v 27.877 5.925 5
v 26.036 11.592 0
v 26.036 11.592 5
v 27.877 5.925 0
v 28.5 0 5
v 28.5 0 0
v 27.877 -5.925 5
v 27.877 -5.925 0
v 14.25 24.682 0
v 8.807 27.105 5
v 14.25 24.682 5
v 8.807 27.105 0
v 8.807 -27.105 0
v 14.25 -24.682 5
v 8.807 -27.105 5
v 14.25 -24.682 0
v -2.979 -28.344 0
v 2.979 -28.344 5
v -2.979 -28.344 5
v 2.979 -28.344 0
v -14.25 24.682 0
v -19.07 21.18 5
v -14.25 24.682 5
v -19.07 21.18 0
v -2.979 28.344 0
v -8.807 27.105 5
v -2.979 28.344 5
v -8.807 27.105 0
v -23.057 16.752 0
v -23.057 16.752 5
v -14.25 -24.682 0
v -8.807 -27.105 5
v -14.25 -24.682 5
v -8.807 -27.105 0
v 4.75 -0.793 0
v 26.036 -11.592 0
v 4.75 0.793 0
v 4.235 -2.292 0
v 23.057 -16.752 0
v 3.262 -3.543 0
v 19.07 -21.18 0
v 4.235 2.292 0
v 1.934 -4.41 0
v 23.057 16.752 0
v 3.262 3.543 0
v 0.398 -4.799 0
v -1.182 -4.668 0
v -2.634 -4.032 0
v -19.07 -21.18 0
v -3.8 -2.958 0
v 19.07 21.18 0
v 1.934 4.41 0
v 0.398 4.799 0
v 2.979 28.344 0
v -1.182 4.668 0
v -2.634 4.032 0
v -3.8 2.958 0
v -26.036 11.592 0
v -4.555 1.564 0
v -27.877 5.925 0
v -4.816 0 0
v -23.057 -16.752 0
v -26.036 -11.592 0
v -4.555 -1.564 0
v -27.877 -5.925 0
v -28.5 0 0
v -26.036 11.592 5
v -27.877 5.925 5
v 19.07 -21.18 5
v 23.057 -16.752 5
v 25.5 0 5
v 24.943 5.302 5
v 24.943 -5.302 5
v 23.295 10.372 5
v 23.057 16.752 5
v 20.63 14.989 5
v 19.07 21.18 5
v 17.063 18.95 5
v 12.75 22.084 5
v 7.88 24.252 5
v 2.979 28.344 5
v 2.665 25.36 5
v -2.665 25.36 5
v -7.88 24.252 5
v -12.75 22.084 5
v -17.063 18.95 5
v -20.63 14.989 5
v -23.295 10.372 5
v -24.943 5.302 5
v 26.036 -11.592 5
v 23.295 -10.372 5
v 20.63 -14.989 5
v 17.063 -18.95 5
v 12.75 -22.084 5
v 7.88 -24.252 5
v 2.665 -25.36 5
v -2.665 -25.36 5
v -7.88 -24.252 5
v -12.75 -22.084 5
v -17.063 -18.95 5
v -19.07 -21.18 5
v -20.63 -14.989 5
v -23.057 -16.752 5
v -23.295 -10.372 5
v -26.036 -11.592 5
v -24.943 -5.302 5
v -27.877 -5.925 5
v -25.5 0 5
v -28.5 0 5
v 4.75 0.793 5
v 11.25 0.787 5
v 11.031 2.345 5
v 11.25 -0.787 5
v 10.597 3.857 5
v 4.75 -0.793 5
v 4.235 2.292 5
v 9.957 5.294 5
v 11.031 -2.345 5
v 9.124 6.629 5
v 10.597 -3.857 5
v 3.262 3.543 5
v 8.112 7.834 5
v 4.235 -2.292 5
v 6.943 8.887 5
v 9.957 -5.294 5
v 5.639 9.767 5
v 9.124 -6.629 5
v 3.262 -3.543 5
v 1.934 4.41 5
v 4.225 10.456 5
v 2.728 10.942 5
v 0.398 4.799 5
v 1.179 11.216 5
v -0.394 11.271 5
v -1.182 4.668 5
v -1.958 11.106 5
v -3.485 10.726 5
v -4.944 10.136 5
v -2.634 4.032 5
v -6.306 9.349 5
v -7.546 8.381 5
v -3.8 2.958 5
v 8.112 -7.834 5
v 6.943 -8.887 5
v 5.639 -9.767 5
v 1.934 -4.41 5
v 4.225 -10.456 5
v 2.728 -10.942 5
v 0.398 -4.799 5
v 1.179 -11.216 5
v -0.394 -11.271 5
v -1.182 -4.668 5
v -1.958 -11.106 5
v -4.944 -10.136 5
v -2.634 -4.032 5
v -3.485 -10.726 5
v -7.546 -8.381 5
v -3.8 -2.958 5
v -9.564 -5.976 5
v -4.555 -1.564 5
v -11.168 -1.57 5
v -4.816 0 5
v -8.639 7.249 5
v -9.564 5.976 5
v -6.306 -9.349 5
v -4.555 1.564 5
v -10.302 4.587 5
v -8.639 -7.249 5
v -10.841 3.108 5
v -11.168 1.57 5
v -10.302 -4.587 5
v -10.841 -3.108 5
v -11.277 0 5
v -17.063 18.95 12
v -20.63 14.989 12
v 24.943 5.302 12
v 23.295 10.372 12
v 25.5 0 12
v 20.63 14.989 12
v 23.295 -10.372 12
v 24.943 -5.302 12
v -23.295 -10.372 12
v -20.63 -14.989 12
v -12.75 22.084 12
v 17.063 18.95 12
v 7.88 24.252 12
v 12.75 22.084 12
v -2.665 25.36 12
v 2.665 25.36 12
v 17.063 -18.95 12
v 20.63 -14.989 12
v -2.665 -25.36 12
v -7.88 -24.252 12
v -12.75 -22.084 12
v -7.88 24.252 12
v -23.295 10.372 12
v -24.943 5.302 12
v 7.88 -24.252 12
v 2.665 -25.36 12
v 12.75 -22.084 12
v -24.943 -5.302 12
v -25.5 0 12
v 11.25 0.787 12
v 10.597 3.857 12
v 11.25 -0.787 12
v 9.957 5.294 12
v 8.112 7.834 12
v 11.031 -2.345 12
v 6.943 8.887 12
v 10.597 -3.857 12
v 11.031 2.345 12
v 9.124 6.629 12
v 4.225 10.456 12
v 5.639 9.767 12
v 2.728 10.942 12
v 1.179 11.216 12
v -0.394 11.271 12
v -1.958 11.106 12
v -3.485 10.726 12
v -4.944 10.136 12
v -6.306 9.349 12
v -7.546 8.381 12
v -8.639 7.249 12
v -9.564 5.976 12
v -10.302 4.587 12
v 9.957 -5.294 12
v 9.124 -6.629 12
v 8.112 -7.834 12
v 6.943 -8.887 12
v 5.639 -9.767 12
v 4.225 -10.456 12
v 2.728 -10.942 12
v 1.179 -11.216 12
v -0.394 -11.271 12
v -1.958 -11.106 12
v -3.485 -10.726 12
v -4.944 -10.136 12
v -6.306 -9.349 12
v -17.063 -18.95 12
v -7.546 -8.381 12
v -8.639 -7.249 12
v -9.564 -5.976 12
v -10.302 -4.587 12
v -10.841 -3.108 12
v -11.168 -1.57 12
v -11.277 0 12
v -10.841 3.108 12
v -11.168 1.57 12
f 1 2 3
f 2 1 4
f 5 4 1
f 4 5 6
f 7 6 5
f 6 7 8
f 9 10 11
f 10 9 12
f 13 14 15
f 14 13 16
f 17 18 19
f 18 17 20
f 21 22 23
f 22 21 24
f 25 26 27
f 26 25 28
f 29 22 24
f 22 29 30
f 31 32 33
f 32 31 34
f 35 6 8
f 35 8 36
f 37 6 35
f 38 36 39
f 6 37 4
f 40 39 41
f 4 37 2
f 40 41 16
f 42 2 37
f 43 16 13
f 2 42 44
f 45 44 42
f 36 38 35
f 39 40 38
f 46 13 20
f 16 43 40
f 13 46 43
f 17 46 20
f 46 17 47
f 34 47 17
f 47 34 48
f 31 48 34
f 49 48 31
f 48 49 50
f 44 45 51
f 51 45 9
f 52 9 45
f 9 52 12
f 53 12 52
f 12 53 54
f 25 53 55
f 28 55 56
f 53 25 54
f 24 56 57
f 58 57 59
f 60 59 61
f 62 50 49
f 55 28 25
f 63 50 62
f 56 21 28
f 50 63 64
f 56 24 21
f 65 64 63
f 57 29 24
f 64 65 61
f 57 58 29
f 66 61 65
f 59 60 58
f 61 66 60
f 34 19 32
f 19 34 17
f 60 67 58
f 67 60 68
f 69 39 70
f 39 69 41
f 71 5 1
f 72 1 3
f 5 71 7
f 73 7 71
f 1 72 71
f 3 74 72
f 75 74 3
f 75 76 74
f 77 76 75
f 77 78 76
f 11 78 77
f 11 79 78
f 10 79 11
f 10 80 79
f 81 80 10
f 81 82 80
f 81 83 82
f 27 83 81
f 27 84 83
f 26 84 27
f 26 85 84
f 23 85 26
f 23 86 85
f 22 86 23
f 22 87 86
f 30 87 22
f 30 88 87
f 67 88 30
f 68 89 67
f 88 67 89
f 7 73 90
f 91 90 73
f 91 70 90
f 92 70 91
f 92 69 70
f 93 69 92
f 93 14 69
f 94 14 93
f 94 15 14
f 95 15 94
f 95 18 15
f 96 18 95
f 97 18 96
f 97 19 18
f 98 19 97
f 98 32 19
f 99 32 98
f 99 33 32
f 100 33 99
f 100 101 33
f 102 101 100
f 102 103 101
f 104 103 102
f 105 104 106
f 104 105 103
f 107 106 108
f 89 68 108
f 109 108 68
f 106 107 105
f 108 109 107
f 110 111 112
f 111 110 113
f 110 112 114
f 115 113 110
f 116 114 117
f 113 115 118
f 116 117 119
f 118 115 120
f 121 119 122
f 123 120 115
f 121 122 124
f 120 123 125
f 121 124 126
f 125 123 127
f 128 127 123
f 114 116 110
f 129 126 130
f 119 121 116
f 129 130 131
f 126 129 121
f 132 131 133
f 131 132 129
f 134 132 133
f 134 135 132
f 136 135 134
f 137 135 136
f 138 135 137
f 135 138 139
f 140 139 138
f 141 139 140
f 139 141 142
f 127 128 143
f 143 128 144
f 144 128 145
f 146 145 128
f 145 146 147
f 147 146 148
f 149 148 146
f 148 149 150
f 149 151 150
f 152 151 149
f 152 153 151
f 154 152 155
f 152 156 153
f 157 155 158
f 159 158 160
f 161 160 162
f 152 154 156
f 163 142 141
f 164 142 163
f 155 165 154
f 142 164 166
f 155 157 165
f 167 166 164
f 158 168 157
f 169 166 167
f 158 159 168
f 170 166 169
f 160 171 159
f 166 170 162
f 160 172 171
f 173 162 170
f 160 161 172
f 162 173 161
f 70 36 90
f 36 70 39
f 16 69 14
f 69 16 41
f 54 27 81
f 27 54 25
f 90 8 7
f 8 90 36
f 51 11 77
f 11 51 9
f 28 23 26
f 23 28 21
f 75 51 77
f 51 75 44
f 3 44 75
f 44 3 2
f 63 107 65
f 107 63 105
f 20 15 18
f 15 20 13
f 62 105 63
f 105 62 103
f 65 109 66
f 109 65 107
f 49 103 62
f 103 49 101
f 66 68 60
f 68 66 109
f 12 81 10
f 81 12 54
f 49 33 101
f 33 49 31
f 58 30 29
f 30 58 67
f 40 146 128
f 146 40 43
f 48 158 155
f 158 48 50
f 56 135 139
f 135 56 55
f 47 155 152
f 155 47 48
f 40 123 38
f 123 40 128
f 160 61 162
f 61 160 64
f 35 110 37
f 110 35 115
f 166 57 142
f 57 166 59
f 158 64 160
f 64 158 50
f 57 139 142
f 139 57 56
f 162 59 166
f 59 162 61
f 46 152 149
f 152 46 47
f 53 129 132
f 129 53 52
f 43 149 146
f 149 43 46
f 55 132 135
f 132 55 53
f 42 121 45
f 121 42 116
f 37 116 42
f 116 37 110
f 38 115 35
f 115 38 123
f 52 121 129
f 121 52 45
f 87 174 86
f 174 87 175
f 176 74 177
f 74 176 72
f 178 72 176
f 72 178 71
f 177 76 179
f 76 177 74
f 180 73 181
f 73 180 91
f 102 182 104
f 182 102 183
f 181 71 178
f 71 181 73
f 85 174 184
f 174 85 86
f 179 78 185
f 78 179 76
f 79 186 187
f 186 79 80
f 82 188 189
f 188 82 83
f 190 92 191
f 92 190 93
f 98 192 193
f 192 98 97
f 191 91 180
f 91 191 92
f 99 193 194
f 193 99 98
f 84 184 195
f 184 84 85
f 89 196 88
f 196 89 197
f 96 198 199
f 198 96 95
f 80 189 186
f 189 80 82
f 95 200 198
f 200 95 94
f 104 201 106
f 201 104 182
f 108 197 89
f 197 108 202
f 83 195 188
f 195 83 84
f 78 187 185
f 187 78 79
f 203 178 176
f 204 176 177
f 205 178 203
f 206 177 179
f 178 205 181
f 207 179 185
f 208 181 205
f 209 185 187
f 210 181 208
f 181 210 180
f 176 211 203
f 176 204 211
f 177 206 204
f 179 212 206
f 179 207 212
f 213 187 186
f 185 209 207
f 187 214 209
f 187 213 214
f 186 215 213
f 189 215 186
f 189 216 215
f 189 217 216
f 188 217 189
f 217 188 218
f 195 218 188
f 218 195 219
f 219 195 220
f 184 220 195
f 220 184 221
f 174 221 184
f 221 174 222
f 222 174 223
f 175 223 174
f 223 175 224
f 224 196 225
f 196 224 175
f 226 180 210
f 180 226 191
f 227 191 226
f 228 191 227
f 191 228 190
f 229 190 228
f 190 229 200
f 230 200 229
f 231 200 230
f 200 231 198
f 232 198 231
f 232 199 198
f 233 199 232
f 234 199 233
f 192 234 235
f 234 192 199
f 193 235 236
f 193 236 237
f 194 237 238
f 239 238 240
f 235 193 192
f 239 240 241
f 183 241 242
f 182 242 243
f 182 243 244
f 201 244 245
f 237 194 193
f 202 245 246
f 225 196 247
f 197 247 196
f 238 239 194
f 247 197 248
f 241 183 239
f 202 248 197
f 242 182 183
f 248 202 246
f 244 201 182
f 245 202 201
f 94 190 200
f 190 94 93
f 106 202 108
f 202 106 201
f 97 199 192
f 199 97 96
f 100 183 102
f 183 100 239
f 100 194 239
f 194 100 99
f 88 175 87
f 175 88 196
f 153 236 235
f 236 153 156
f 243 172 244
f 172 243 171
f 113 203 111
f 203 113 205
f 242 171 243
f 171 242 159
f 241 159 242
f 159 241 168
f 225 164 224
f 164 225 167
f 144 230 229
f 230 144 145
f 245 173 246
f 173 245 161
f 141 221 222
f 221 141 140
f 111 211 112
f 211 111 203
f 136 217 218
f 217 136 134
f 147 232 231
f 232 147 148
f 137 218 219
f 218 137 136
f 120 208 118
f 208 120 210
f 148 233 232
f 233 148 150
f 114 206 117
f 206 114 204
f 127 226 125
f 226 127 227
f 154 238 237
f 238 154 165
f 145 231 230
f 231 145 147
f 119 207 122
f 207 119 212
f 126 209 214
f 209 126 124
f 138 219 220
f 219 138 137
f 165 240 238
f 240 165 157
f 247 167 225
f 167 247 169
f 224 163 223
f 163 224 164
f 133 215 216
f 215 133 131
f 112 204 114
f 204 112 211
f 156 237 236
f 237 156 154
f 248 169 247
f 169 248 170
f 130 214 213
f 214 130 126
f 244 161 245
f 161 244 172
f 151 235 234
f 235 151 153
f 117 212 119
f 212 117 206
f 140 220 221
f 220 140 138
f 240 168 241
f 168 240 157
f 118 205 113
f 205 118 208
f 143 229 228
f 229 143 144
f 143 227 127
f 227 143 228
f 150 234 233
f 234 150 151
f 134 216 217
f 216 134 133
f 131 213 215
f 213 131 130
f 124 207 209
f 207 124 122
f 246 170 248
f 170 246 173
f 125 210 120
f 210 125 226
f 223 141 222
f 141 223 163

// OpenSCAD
// params
bearing_d = 22;
bearing_h = 7;
bearingHole_d = 8;
spool_d = 51; //32, 51
spool_h = 86;
// endparams

base_h = (96 - spool_h) / 2;

module innerHole(d, h) {
	d = d + 0.5;
	n = max(round(2 * d),3);
   rotate([0,0,180])
		cylinder(h = h, r = (d / 2) / cos (180 / n), $fn = n);
}

difference() {
	cylinder(d = spool_d + 6, h = base_h);
	innerHole(d = bearingHole_d + 1, h = base_h);
}

translate([0, 0, base_h])
	difference() {
		cylinder(d = spool_d, h = bearing_h);
		innerHole(d = bearing_d, h = bearing_h);
	}
